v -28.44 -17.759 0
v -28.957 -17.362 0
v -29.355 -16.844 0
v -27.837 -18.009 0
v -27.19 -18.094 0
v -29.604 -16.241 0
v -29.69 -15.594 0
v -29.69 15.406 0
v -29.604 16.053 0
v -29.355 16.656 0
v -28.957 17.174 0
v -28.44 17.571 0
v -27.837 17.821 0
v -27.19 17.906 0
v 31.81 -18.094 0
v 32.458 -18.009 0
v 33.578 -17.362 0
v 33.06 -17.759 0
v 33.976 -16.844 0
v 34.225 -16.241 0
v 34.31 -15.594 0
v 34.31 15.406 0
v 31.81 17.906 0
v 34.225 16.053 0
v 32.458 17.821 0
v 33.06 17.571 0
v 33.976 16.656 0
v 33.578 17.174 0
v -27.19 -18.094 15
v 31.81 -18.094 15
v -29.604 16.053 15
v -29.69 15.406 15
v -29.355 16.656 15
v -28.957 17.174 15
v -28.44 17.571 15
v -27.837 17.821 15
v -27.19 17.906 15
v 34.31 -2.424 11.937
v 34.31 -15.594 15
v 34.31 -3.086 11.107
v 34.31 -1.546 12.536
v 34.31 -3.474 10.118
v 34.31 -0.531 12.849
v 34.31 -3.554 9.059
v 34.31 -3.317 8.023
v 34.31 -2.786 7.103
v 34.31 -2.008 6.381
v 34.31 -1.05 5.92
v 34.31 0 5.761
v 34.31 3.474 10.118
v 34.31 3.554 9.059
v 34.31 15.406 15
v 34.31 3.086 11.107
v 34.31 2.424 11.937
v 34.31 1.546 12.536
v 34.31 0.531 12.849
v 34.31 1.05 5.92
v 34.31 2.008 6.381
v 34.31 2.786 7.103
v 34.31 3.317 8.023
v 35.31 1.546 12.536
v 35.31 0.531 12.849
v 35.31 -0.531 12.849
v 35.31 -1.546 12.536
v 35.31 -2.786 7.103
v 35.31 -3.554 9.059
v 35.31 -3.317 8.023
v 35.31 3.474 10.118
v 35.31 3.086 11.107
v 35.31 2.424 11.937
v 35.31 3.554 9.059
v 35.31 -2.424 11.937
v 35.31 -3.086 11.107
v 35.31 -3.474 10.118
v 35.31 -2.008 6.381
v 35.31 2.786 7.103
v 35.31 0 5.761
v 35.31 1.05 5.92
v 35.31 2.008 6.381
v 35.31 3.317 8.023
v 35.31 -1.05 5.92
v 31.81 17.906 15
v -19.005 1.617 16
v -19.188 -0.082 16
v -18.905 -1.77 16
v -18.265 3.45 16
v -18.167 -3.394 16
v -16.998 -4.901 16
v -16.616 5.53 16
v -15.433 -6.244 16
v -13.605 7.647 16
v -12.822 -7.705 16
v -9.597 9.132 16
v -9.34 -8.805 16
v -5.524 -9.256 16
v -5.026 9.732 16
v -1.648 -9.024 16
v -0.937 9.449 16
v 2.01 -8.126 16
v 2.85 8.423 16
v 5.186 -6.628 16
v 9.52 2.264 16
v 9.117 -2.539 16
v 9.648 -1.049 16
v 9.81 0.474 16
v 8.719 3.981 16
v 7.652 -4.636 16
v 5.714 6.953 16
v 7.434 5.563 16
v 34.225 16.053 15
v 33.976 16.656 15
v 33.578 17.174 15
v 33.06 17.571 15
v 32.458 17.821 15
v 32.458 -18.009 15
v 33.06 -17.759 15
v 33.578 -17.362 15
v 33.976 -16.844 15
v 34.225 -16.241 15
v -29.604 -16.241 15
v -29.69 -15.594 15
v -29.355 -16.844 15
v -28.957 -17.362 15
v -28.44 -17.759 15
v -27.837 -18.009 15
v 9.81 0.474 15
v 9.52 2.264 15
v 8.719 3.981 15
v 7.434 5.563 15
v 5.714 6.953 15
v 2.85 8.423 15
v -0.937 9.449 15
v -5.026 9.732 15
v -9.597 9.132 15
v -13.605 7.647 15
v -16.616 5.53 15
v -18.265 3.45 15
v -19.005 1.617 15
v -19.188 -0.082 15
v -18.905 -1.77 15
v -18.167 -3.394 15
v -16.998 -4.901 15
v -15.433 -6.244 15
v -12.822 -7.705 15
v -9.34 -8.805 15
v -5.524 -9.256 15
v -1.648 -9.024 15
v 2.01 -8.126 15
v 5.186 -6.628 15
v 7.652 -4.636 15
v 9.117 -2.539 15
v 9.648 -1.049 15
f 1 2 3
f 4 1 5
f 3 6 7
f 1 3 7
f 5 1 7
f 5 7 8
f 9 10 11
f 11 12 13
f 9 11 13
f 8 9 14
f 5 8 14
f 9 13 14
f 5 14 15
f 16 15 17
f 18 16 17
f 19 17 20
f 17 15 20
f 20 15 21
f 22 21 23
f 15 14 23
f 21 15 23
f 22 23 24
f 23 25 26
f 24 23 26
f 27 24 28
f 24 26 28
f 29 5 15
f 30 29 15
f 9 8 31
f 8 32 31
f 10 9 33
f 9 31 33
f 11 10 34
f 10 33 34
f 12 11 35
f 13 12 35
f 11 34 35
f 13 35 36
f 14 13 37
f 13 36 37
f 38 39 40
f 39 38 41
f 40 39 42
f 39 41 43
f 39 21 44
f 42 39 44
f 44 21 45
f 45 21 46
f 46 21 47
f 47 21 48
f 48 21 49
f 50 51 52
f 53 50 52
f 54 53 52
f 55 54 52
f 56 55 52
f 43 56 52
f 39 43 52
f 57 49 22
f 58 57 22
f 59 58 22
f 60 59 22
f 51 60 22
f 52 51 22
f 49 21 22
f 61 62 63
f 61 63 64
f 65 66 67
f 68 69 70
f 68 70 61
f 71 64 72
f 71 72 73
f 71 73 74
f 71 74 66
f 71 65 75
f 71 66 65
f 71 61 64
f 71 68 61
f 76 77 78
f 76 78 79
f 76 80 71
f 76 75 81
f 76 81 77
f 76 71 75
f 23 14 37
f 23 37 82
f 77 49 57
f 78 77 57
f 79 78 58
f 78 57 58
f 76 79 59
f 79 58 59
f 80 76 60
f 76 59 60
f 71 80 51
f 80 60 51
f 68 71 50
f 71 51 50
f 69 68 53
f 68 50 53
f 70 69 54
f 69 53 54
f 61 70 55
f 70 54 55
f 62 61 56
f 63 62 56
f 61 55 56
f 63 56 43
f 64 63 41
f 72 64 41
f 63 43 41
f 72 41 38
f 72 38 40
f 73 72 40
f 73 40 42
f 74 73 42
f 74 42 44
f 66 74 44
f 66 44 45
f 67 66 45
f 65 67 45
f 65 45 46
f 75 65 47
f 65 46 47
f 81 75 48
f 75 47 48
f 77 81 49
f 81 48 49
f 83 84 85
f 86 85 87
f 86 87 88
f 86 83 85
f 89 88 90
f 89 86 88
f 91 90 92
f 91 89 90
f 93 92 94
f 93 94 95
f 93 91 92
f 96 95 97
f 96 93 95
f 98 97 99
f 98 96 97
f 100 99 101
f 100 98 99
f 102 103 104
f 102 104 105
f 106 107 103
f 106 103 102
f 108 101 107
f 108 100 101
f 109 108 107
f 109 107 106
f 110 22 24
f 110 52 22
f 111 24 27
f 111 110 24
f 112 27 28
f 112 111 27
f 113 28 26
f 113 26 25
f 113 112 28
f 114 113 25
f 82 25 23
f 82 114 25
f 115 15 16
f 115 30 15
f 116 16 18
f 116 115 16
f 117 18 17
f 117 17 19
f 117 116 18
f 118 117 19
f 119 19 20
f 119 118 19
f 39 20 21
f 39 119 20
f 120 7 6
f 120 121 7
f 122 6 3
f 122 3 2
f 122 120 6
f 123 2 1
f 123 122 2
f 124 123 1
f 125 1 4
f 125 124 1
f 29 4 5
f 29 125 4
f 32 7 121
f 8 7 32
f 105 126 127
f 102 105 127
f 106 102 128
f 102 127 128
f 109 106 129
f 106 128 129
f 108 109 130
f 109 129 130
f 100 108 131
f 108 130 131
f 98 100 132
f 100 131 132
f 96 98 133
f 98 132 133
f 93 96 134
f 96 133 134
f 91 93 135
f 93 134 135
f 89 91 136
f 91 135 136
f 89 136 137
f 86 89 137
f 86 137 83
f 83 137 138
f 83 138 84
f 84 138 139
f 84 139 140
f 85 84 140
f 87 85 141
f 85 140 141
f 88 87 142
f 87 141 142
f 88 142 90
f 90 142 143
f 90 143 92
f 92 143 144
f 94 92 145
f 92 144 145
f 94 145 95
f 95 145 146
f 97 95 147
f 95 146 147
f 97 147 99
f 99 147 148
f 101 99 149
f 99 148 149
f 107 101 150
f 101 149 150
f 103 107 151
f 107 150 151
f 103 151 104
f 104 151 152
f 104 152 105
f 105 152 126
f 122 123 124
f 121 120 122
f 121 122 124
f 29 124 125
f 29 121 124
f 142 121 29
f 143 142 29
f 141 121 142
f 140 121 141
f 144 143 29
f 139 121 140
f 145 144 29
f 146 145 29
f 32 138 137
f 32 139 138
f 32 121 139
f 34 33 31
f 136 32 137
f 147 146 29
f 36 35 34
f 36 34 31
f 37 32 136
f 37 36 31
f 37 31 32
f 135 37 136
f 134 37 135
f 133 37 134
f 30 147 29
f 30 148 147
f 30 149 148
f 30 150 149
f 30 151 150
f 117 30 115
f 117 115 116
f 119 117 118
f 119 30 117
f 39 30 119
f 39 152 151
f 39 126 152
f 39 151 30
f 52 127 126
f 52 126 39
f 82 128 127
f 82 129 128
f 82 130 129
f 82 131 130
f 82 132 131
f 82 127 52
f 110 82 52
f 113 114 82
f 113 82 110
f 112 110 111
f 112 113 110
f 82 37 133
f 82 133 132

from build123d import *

# Parameters (mm, degrees)
SKETCH1_W           = 64
SKETCH1_H           = 36
BOSS_EXTRUDE1_DEPTH = 15
FILLET1_R           = 2.5
SKETCH2_RX          = 14.501940206
SKETCH2_RY          = 9.5
BOSS_EXTRUDE2_DEPTH = 1
SKETCH3_R           = 3.563696192
BOSS_EXTRUDE3_DEPTH = 1


with BuildPart() as part:
    # Sketch1 → Boss-Extrude1 (new body)
    with BuildSketch(Plane.XY):
        with Locations((2.310469314, -0.093862816)):
            Rectangle(SKETCH1_W, SKETCH1_H)
    extrude(amount=BOSS_EXTRUDE1_DEPTH)

    # Fillet1
    fillet1_edges = [part.edges().sort_by_distance(p)[0] for p in [
        (-29.689530686, 17.906137184, 7.5),
        (34.310469314, 17.906137184, 7.5),
        (34.310469314, -18.093862816, 7.5),
        (-29.689530686, -18.093862816, 7.5),
    ]]
    fillet(fillet1_edges, radius=FILLET1_R)

    # Sketch2 → Boss-Extrude2 (add)
    with BuildSketch(Plane.XY.offset(15)):
        with Locations(Location((-4.689530686, 0.237212403), (0, 0, 0.937245327))):
            Ellipse(SKETCH2_RX, SKETCH2_RY)
    extrude(amount=BOSS_EXTRUDE2_DEPTH)

    # Sketch3 → Boss-Extrude3 (add)
    with BuildSketch(Plane(origin=(34.310469314, 0, 0), x_dir=(0, 0, -1), z_dir=(1, 0, 0))):
        with Locations((-9.325073978, 0)):
            Circle(SKETCH3_R)
    extrude(amount=BOSS_EXTRUDE3_DEPTH)


solid = part.part
